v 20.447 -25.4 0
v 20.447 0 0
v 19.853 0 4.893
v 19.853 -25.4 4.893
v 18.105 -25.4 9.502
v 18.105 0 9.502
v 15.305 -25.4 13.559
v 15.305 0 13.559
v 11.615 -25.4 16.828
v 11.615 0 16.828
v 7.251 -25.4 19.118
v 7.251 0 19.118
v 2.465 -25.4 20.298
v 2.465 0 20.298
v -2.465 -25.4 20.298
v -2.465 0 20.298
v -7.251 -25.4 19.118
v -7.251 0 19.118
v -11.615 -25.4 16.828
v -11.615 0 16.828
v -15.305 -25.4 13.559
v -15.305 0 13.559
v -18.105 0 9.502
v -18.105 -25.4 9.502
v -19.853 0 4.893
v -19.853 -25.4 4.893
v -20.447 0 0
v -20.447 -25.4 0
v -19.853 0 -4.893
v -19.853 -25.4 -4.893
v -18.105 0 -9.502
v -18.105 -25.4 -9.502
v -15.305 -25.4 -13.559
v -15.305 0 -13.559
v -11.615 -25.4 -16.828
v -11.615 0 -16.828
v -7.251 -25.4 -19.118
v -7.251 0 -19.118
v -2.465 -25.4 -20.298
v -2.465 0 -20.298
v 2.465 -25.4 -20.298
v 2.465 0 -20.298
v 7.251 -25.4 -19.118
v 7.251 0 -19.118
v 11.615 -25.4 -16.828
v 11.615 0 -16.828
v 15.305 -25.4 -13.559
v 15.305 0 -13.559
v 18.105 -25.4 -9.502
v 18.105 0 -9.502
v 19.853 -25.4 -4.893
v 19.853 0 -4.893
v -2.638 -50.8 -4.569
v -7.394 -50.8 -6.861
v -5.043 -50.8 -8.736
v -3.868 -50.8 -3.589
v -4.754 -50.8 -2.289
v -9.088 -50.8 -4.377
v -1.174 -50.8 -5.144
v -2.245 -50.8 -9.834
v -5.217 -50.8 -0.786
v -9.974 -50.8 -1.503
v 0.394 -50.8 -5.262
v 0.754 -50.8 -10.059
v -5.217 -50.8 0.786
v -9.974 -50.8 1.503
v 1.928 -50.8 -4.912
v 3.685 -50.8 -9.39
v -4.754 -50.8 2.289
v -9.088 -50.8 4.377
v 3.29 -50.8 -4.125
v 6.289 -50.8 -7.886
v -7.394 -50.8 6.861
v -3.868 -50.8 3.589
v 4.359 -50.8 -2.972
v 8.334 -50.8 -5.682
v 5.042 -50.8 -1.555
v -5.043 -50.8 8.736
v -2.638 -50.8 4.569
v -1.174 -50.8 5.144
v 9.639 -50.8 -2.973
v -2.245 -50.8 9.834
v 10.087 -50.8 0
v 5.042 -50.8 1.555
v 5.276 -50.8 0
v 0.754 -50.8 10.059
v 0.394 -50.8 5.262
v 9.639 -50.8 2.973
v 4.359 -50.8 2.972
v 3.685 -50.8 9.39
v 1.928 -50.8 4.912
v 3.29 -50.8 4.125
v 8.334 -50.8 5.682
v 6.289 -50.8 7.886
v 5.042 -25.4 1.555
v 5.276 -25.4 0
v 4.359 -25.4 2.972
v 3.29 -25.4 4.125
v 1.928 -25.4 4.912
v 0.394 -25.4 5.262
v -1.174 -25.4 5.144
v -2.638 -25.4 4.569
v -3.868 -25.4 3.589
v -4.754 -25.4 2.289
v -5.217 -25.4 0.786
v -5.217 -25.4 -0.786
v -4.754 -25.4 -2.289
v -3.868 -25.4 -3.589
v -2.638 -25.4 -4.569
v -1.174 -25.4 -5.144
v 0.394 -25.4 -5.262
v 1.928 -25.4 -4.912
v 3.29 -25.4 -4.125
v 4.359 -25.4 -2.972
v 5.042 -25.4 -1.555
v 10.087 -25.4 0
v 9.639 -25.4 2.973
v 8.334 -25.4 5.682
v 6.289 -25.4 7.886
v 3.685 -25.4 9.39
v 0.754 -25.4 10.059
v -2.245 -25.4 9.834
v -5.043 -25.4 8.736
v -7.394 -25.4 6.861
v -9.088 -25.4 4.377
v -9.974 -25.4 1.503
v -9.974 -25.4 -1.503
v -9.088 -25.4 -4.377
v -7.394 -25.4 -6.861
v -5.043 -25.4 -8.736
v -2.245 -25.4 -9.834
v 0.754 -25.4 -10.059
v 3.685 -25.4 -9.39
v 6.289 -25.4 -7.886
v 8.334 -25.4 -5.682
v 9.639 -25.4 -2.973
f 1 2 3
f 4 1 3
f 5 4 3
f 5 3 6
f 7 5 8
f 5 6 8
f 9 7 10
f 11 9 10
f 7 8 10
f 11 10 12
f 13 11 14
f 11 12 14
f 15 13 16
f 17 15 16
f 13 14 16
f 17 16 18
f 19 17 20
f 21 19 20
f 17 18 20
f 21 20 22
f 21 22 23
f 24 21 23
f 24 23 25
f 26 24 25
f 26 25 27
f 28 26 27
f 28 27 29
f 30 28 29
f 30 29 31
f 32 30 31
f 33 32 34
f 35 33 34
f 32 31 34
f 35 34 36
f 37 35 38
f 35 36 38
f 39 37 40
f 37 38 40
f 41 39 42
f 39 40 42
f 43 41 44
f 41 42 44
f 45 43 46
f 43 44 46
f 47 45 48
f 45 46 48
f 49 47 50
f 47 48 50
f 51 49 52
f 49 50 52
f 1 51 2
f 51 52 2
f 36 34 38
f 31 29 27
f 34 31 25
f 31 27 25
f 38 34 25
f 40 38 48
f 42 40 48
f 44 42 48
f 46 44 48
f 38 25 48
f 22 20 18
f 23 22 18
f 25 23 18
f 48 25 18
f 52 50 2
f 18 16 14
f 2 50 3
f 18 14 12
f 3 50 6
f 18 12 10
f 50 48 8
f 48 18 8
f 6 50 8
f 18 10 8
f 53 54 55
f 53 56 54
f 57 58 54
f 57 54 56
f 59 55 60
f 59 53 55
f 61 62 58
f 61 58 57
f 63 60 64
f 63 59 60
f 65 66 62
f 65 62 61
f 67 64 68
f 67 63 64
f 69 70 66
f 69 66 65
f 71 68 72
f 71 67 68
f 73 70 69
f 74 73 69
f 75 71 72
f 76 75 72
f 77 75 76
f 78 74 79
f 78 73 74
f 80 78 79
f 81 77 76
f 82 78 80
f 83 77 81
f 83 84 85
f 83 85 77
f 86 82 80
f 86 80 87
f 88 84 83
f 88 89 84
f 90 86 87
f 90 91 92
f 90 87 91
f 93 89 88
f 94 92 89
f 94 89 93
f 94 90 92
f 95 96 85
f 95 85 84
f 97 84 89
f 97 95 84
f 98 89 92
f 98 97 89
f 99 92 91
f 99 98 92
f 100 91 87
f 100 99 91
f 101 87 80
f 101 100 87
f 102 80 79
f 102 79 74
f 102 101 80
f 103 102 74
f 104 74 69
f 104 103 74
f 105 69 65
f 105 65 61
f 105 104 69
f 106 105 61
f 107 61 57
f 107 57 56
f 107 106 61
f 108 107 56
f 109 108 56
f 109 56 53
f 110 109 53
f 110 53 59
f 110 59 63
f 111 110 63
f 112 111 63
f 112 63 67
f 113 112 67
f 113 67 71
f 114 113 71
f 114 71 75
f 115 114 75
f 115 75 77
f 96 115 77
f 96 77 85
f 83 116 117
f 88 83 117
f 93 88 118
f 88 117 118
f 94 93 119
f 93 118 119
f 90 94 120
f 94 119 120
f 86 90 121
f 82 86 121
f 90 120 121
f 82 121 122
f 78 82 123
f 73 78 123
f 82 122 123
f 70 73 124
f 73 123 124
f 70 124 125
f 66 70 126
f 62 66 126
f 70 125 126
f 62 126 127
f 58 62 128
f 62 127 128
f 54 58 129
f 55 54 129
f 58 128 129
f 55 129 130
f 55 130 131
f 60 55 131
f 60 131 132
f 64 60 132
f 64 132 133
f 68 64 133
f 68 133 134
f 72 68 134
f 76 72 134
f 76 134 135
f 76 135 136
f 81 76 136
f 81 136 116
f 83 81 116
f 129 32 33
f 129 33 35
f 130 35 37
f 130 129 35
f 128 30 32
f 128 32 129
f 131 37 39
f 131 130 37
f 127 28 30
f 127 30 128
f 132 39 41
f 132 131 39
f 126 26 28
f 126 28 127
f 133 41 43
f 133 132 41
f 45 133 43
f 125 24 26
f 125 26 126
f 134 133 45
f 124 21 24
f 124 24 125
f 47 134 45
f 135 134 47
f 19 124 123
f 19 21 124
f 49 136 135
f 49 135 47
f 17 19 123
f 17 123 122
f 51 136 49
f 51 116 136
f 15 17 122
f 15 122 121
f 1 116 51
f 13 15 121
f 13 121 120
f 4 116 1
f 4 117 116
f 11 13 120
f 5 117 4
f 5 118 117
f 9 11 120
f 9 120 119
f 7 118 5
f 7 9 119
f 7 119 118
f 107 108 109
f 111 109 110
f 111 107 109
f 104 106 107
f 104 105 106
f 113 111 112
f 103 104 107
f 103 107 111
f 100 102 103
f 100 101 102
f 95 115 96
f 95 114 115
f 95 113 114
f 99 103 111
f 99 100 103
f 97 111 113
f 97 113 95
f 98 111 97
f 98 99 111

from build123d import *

# Parameters (mm, degrees)
F0_R     = 20.44695
F0_R_2   = 10.086929
F0_R_3   = 5.276256
F1_DEPTH = 25.4
F2_DEPTH = 50.8


with BuildPart() as f1:
    # F0 (on Front) → F1 (new body)
    with BuildSketch(Plane.XZ):
        Circle(F0_R)
        Circle(F0_R_2, mode=Mode.SUBTRACT)
        Circle(F0_R_2)
        Circle(F0_R_3, mode=Mode.SUBTRACT)
        Circle(F0_R_3)
    extrude(amount=F1_DEPTH)

    # F0 (on Front) → F2 (join)
    with BuildSketch(Plane.XZ):
        Circle(F0_R_2)
        Circle(F0_R_3, mode=Mode.SUBTRACT)
    extrude(amount=F2_DEPTH)


solid = f1.part
